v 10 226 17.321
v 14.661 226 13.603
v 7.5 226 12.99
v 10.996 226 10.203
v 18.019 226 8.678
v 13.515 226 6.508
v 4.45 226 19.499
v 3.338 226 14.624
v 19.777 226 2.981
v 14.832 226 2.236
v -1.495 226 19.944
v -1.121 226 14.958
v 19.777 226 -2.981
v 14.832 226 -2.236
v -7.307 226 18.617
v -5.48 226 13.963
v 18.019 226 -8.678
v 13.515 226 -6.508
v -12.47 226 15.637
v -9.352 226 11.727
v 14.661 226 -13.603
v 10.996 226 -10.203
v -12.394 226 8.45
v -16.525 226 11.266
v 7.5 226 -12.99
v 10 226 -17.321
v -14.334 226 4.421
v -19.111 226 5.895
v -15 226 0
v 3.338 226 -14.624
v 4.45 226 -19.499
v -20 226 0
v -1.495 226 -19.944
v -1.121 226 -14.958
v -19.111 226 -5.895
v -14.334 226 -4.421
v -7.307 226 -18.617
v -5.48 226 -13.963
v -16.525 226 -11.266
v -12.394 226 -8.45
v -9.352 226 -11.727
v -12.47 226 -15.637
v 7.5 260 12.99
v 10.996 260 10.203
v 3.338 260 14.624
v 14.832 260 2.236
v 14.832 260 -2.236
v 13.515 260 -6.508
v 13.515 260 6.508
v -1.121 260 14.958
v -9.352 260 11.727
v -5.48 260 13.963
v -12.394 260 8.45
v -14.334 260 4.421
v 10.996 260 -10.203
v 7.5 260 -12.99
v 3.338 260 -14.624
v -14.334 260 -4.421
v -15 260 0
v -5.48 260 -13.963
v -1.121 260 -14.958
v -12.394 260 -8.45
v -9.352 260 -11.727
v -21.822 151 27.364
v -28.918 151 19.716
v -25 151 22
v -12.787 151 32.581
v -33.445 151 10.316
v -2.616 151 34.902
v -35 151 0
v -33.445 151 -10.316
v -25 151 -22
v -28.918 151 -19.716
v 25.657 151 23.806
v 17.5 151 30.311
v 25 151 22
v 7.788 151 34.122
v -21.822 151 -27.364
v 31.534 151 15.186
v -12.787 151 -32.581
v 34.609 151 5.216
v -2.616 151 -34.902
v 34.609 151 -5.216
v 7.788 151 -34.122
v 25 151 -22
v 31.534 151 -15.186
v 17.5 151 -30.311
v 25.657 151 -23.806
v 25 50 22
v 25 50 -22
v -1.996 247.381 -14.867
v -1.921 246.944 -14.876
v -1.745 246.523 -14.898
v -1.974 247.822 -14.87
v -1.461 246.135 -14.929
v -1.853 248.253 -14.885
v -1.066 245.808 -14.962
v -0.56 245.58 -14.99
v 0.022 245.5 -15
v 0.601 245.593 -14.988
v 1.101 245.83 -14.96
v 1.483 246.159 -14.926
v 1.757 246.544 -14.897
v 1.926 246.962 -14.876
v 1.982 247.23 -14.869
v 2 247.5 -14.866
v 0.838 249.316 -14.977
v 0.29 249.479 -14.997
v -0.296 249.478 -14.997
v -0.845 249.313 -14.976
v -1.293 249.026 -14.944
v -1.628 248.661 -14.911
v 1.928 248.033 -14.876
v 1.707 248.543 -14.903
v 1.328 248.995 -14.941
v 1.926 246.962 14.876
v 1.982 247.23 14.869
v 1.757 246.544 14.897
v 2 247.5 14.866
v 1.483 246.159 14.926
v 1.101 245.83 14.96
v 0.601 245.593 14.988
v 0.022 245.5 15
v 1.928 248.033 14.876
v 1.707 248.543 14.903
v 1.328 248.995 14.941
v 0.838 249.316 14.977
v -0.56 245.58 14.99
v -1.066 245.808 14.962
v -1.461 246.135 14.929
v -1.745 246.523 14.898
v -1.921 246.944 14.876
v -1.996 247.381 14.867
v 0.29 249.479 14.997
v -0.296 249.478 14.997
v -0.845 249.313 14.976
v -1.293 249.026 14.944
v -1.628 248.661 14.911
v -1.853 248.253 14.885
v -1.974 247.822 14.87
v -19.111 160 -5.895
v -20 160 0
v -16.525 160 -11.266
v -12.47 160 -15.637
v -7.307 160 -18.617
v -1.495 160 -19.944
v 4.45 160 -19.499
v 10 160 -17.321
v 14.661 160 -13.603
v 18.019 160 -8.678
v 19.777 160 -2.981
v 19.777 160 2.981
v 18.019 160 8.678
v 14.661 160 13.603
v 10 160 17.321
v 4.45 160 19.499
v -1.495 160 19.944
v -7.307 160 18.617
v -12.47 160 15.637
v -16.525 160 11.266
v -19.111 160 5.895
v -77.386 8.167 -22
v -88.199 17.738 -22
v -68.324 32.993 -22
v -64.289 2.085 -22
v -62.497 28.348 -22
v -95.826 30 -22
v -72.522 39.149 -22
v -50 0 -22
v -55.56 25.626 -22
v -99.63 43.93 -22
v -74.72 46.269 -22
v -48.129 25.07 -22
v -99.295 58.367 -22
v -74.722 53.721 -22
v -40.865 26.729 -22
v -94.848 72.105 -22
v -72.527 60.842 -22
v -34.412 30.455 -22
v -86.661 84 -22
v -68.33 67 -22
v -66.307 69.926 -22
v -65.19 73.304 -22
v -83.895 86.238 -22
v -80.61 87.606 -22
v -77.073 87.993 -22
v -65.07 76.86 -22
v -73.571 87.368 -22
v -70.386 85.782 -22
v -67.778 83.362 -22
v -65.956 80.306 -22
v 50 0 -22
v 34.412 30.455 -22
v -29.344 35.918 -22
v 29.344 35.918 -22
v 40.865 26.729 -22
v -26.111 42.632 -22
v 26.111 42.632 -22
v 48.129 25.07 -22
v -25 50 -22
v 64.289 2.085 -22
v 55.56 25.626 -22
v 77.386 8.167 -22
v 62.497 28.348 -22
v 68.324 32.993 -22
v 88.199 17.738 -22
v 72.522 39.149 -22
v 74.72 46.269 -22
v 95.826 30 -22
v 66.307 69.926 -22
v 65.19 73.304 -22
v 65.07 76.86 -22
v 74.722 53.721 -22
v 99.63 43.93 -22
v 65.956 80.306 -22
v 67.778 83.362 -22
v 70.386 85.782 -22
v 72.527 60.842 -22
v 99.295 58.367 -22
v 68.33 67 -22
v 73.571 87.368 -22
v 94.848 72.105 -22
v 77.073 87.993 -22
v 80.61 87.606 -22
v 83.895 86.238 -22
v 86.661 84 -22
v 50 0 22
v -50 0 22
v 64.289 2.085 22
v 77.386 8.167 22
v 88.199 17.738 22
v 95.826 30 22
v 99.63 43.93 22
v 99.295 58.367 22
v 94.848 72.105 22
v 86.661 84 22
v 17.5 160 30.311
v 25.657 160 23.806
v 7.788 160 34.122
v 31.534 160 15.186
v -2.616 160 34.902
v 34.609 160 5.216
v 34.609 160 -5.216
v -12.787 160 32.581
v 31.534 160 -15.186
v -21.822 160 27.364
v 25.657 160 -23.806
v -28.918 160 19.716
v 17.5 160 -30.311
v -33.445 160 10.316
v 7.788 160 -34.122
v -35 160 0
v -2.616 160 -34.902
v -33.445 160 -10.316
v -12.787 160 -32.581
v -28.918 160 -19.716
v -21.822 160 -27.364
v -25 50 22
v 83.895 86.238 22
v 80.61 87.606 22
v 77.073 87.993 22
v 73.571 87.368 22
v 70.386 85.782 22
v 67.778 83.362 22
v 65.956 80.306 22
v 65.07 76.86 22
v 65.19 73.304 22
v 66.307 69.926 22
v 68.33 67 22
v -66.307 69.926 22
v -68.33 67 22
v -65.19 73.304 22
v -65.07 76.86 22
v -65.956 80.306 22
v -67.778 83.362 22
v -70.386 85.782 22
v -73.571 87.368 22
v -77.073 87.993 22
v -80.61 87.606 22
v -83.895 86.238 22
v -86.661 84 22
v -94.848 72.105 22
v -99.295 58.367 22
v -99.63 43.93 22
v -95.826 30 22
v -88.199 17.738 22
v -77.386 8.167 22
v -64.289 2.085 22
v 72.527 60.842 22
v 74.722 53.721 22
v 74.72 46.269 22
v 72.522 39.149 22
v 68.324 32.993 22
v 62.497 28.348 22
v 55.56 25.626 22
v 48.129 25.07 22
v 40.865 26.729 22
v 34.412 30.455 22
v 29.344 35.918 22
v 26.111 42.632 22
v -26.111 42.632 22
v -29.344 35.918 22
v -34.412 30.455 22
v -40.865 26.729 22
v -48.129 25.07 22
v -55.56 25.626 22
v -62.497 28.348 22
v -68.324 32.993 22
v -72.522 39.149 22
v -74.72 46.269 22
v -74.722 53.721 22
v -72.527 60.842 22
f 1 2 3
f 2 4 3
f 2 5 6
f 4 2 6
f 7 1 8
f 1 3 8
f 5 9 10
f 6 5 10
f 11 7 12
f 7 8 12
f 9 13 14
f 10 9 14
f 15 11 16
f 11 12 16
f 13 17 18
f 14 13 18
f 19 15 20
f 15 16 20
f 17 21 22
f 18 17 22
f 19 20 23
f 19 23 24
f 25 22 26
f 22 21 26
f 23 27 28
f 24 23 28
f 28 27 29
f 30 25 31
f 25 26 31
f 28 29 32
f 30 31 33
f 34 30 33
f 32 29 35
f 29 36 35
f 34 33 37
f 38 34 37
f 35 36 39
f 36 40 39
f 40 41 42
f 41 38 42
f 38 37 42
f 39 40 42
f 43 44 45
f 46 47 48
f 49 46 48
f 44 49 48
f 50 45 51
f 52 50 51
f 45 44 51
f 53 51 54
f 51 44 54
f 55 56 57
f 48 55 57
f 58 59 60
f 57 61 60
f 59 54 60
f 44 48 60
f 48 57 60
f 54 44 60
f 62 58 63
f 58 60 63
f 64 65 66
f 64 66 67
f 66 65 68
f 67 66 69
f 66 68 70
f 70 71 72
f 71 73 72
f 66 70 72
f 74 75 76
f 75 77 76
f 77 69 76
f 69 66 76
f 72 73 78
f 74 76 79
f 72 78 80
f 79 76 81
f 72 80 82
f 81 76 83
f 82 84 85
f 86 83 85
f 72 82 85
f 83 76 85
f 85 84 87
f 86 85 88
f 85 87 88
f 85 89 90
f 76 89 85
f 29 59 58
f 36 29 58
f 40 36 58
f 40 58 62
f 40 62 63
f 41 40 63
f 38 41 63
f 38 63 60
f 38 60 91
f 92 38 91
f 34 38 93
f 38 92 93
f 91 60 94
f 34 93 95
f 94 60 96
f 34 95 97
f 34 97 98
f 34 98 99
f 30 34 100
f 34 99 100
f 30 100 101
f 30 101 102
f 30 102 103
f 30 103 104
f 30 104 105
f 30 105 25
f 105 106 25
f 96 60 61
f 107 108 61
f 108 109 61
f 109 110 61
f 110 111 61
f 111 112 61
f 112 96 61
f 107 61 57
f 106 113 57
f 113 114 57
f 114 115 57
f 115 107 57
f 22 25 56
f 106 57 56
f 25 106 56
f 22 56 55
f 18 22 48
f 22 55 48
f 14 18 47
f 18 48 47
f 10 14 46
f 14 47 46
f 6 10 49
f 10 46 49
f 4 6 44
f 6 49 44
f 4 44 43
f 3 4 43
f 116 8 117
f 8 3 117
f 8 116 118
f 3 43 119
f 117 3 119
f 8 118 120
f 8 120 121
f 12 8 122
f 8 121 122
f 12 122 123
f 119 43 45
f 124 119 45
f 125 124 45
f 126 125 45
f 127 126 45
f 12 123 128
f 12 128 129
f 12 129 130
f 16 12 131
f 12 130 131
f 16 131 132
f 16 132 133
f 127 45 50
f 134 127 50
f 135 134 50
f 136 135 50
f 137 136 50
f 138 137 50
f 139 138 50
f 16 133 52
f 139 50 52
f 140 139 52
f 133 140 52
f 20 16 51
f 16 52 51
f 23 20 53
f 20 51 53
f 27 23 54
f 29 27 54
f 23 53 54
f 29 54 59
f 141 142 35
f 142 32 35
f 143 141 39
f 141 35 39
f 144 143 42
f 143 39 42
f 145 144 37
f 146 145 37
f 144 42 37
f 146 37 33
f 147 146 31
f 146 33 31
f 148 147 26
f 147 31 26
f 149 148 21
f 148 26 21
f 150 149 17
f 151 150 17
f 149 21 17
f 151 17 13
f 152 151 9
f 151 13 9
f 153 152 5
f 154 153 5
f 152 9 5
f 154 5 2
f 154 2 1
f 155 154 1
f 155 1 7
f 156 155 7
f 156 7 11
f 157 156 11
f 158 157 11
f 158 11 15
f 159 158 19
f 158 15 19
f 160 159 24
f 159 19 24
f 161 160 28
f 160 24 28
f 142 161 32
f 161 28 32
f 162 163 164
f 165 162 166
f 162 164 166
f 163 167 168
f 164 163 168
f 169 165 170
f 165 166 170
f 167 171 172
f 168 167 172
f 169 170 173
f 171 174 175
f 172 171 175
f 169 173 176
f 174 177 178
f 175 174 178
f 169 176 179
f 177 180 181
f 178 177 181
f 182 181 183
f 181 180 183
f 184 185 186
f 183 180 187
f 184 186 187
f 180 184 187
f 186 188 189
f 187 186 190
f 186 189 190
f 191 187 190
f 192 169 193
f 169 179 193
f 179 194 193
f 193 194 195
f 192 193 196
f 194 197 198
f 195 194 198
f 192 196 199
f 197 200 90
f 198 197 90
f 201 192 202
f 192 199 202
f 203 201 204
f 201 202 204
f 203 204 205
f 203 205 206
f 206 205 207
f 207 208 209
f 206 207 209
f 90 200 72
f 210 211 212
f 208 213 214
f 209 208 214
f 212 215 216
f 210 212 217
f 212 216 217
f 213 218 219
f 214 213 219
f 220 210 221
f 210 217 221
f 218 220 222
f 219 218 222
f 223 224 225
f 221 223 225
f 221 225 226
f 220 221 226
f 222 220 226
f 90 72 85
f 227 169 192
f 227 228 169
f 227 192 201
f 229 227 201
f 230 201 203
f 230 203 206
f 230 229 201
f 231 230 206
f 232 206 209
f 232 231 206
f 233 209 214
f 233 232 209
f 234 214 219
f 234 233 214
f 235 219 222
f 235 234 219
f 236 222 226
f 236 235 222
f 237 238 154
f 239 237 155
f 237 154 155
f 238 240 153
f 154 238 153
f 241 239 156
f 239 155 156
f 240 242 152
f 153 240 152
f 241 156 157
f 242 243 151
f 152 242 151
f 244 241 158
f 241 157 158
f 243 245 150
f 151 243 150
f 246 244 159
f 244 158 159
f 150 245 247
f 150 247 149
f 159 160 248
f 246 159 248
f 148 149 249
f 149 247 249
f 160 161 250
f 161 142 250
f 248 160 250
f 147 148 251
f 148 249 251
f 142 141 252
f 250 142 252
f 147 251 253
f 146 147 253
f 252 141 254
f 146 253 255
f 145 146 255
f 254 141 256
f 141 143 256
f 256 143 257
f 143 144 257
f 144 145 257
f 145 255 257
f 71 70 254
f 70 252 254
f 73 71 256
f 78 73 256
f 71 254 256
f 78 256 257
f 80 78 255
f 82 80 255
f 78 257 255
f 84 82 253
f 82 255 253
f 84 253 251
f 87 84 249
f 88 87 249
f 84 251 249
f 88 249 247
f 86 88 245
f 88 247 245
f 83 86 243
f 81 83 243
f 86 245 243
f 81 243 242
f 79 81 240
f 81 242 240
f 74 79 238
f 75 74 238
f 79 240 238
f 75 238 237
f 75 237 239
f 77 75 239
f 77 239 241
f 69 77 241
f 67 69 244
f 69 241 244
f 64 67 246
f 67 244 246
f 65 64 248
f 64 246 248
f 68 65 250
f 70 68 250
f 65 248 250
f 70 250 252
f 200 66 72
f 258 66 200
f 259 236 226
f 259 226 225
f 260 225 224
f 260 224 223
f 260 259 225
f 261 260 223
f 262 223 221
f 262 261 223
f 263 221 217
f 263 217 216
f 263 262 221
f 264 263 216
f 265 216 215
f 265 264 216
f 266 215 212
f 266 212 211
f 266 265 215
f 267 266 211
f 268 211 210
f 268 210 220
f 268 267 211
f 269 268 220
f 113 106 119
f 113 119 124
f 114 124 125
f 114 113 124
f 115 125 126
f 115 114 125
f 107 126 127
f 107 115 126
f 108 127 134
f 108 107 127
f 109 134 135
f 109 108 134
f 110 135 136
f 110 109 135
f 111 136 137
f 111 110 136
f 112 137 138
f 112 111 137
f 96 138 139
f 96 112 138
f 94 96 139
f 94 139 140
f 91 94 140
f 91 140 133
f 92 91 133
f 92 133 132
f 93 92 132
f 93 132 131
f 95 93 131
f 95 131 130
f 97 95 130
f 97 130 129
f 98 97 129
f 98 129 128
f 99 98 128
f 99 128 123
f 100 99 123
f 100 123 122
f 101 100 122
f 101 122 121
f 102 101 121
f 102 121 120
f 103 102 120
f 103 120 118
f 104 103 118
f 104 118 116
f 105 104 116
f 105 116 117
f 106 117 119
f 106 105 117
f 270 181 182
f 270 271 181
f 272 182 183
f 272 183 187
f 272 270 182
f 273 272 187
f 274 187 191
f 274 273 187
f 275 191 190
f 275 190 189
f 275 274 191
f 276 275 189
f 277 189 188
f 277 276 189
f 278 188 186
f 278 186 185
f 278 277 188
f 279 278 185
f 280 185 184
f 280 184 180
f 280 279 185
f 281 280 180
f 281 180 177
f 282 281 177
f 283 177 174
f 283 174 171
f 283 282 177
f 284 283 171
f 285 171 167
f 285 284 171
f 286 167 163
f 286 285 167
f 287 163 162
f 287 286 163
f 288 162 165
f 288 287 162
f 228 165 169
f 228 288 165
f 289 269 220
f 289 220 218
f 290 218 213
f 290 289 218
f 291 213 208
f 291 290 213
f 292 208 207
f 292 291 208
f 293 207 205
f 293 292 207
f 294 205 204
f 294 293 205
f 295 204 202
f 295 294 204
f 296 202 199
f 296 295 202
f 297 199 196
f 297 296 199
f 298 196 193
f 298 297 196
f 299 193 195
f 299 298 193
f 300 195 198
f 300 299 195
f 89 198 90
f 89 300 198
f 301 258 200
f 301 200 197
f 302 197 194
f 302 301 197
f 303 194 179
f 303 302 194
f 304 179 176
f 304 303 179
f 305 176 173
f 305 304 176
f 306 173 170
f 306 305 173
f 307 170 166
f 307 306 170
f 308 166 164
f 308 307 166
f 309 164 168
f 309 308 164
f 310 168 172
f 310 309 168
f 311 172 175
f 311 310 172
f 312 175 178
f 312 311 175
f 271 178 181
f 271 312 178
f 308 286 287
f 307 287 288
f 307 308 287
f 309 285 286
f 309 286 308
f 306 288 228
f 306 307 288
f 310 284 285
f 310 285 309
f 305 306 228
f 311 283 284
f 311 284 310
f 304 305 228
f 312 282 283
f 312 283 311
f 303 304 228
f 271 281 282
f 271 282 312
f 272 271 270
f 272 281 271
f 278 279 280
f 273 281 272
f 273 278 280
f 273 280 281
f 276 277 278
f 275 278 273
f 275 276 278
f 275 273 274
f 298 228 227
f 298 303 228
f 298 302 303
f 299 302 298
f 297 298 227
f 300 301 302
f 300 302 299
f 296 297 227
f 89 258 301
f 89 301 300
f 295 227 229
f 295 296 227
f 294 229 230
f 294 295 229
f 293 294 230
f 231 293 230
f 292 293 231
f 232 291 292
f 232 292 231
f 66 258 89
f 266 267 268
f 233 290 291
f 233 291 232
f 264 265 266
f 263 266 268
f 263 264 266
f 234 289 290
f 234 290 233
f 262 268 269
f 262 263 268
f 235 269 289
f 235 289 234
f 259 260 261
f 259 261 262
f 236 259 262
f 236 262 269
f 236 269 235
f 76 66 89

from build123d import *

# Parameters (mm, degrees)
BOSS_EXTRUDE1_DEPTH     = 22
CUT_EXTRUDE1_DEPTH      = 281.757902827
CUT_EXTRUDE1_DEPTH_BACK = 281.757902827
SKETCH3_R               = 2


with BuildPart() as part:
    # Sketch1 → Boss-Extrude1 (new, symmetric)
    with BuildSketch(Plane.XY):
        with BuildLine():
            Line((-50, 0), (50, 0))
            ThreePointArc((50, 0), (95.82575695, 30), (86.66060556, 84))
            ThreePointArc((86.66060556, 84), (68.99545417, 84.66515139), (68.33030278, 67))
            ThreePointArc((68.33030278, 67), (59.130783934, 26.727080442), (25, 50))
            Line((25, 50), (25, 151))
            Line((25, 151), (-25, 151))
            Line((-25, 151), (-25, 50))
            ThreePointArc((-25, 50), (-59.130783934, 26.727080442), (-68.33030278, 67))
            ThreePointArc((-68.33030278, 67), (-68.99545417, 84.66515139), (-86.66060556, 84))
            ThreePointArc((-86.66060556, 84), (-95.82575695, 30), (-50, 0))
        make_face()
    extrude(amount=BOSS_EXTRUDE1_DEPTH, both=True)

    # Sketch2 → Revolve1 (revolve)
    with BuildSketch(Plane.XY, mode=Mode.PRIVATE) as revolve1_sk:
        Polygon((0, 151), (35, 151), (35, 160), (20, 160), (20, 226), (15, 226), (15, 260), (0, 260), align=None)
    revolve(revolve1_sk.sketch.rotate(Axis((0, 260, 0), (0, -1, 0)), 180), axis=Axis((0, 260, 0), (0, -1, 0)))

    # Sketch3 → Cut-Extrude1 (cut, two sides: drawn at the far end of the back side and taken through both)
    with BuildSketch(Plane.XY.offset(-CUT_EXTRUDE1_DEPTH_BACK)):
        with Locations((0, 247.5)):
            Circle(SKETCH3_R)
    extrude(amount=CUT_EXTRUDE1_DEPTH + CUT_EXTRUDE1_DEPTH_BACK, mode=Mode.SUBTRACT)


solid = part.part
